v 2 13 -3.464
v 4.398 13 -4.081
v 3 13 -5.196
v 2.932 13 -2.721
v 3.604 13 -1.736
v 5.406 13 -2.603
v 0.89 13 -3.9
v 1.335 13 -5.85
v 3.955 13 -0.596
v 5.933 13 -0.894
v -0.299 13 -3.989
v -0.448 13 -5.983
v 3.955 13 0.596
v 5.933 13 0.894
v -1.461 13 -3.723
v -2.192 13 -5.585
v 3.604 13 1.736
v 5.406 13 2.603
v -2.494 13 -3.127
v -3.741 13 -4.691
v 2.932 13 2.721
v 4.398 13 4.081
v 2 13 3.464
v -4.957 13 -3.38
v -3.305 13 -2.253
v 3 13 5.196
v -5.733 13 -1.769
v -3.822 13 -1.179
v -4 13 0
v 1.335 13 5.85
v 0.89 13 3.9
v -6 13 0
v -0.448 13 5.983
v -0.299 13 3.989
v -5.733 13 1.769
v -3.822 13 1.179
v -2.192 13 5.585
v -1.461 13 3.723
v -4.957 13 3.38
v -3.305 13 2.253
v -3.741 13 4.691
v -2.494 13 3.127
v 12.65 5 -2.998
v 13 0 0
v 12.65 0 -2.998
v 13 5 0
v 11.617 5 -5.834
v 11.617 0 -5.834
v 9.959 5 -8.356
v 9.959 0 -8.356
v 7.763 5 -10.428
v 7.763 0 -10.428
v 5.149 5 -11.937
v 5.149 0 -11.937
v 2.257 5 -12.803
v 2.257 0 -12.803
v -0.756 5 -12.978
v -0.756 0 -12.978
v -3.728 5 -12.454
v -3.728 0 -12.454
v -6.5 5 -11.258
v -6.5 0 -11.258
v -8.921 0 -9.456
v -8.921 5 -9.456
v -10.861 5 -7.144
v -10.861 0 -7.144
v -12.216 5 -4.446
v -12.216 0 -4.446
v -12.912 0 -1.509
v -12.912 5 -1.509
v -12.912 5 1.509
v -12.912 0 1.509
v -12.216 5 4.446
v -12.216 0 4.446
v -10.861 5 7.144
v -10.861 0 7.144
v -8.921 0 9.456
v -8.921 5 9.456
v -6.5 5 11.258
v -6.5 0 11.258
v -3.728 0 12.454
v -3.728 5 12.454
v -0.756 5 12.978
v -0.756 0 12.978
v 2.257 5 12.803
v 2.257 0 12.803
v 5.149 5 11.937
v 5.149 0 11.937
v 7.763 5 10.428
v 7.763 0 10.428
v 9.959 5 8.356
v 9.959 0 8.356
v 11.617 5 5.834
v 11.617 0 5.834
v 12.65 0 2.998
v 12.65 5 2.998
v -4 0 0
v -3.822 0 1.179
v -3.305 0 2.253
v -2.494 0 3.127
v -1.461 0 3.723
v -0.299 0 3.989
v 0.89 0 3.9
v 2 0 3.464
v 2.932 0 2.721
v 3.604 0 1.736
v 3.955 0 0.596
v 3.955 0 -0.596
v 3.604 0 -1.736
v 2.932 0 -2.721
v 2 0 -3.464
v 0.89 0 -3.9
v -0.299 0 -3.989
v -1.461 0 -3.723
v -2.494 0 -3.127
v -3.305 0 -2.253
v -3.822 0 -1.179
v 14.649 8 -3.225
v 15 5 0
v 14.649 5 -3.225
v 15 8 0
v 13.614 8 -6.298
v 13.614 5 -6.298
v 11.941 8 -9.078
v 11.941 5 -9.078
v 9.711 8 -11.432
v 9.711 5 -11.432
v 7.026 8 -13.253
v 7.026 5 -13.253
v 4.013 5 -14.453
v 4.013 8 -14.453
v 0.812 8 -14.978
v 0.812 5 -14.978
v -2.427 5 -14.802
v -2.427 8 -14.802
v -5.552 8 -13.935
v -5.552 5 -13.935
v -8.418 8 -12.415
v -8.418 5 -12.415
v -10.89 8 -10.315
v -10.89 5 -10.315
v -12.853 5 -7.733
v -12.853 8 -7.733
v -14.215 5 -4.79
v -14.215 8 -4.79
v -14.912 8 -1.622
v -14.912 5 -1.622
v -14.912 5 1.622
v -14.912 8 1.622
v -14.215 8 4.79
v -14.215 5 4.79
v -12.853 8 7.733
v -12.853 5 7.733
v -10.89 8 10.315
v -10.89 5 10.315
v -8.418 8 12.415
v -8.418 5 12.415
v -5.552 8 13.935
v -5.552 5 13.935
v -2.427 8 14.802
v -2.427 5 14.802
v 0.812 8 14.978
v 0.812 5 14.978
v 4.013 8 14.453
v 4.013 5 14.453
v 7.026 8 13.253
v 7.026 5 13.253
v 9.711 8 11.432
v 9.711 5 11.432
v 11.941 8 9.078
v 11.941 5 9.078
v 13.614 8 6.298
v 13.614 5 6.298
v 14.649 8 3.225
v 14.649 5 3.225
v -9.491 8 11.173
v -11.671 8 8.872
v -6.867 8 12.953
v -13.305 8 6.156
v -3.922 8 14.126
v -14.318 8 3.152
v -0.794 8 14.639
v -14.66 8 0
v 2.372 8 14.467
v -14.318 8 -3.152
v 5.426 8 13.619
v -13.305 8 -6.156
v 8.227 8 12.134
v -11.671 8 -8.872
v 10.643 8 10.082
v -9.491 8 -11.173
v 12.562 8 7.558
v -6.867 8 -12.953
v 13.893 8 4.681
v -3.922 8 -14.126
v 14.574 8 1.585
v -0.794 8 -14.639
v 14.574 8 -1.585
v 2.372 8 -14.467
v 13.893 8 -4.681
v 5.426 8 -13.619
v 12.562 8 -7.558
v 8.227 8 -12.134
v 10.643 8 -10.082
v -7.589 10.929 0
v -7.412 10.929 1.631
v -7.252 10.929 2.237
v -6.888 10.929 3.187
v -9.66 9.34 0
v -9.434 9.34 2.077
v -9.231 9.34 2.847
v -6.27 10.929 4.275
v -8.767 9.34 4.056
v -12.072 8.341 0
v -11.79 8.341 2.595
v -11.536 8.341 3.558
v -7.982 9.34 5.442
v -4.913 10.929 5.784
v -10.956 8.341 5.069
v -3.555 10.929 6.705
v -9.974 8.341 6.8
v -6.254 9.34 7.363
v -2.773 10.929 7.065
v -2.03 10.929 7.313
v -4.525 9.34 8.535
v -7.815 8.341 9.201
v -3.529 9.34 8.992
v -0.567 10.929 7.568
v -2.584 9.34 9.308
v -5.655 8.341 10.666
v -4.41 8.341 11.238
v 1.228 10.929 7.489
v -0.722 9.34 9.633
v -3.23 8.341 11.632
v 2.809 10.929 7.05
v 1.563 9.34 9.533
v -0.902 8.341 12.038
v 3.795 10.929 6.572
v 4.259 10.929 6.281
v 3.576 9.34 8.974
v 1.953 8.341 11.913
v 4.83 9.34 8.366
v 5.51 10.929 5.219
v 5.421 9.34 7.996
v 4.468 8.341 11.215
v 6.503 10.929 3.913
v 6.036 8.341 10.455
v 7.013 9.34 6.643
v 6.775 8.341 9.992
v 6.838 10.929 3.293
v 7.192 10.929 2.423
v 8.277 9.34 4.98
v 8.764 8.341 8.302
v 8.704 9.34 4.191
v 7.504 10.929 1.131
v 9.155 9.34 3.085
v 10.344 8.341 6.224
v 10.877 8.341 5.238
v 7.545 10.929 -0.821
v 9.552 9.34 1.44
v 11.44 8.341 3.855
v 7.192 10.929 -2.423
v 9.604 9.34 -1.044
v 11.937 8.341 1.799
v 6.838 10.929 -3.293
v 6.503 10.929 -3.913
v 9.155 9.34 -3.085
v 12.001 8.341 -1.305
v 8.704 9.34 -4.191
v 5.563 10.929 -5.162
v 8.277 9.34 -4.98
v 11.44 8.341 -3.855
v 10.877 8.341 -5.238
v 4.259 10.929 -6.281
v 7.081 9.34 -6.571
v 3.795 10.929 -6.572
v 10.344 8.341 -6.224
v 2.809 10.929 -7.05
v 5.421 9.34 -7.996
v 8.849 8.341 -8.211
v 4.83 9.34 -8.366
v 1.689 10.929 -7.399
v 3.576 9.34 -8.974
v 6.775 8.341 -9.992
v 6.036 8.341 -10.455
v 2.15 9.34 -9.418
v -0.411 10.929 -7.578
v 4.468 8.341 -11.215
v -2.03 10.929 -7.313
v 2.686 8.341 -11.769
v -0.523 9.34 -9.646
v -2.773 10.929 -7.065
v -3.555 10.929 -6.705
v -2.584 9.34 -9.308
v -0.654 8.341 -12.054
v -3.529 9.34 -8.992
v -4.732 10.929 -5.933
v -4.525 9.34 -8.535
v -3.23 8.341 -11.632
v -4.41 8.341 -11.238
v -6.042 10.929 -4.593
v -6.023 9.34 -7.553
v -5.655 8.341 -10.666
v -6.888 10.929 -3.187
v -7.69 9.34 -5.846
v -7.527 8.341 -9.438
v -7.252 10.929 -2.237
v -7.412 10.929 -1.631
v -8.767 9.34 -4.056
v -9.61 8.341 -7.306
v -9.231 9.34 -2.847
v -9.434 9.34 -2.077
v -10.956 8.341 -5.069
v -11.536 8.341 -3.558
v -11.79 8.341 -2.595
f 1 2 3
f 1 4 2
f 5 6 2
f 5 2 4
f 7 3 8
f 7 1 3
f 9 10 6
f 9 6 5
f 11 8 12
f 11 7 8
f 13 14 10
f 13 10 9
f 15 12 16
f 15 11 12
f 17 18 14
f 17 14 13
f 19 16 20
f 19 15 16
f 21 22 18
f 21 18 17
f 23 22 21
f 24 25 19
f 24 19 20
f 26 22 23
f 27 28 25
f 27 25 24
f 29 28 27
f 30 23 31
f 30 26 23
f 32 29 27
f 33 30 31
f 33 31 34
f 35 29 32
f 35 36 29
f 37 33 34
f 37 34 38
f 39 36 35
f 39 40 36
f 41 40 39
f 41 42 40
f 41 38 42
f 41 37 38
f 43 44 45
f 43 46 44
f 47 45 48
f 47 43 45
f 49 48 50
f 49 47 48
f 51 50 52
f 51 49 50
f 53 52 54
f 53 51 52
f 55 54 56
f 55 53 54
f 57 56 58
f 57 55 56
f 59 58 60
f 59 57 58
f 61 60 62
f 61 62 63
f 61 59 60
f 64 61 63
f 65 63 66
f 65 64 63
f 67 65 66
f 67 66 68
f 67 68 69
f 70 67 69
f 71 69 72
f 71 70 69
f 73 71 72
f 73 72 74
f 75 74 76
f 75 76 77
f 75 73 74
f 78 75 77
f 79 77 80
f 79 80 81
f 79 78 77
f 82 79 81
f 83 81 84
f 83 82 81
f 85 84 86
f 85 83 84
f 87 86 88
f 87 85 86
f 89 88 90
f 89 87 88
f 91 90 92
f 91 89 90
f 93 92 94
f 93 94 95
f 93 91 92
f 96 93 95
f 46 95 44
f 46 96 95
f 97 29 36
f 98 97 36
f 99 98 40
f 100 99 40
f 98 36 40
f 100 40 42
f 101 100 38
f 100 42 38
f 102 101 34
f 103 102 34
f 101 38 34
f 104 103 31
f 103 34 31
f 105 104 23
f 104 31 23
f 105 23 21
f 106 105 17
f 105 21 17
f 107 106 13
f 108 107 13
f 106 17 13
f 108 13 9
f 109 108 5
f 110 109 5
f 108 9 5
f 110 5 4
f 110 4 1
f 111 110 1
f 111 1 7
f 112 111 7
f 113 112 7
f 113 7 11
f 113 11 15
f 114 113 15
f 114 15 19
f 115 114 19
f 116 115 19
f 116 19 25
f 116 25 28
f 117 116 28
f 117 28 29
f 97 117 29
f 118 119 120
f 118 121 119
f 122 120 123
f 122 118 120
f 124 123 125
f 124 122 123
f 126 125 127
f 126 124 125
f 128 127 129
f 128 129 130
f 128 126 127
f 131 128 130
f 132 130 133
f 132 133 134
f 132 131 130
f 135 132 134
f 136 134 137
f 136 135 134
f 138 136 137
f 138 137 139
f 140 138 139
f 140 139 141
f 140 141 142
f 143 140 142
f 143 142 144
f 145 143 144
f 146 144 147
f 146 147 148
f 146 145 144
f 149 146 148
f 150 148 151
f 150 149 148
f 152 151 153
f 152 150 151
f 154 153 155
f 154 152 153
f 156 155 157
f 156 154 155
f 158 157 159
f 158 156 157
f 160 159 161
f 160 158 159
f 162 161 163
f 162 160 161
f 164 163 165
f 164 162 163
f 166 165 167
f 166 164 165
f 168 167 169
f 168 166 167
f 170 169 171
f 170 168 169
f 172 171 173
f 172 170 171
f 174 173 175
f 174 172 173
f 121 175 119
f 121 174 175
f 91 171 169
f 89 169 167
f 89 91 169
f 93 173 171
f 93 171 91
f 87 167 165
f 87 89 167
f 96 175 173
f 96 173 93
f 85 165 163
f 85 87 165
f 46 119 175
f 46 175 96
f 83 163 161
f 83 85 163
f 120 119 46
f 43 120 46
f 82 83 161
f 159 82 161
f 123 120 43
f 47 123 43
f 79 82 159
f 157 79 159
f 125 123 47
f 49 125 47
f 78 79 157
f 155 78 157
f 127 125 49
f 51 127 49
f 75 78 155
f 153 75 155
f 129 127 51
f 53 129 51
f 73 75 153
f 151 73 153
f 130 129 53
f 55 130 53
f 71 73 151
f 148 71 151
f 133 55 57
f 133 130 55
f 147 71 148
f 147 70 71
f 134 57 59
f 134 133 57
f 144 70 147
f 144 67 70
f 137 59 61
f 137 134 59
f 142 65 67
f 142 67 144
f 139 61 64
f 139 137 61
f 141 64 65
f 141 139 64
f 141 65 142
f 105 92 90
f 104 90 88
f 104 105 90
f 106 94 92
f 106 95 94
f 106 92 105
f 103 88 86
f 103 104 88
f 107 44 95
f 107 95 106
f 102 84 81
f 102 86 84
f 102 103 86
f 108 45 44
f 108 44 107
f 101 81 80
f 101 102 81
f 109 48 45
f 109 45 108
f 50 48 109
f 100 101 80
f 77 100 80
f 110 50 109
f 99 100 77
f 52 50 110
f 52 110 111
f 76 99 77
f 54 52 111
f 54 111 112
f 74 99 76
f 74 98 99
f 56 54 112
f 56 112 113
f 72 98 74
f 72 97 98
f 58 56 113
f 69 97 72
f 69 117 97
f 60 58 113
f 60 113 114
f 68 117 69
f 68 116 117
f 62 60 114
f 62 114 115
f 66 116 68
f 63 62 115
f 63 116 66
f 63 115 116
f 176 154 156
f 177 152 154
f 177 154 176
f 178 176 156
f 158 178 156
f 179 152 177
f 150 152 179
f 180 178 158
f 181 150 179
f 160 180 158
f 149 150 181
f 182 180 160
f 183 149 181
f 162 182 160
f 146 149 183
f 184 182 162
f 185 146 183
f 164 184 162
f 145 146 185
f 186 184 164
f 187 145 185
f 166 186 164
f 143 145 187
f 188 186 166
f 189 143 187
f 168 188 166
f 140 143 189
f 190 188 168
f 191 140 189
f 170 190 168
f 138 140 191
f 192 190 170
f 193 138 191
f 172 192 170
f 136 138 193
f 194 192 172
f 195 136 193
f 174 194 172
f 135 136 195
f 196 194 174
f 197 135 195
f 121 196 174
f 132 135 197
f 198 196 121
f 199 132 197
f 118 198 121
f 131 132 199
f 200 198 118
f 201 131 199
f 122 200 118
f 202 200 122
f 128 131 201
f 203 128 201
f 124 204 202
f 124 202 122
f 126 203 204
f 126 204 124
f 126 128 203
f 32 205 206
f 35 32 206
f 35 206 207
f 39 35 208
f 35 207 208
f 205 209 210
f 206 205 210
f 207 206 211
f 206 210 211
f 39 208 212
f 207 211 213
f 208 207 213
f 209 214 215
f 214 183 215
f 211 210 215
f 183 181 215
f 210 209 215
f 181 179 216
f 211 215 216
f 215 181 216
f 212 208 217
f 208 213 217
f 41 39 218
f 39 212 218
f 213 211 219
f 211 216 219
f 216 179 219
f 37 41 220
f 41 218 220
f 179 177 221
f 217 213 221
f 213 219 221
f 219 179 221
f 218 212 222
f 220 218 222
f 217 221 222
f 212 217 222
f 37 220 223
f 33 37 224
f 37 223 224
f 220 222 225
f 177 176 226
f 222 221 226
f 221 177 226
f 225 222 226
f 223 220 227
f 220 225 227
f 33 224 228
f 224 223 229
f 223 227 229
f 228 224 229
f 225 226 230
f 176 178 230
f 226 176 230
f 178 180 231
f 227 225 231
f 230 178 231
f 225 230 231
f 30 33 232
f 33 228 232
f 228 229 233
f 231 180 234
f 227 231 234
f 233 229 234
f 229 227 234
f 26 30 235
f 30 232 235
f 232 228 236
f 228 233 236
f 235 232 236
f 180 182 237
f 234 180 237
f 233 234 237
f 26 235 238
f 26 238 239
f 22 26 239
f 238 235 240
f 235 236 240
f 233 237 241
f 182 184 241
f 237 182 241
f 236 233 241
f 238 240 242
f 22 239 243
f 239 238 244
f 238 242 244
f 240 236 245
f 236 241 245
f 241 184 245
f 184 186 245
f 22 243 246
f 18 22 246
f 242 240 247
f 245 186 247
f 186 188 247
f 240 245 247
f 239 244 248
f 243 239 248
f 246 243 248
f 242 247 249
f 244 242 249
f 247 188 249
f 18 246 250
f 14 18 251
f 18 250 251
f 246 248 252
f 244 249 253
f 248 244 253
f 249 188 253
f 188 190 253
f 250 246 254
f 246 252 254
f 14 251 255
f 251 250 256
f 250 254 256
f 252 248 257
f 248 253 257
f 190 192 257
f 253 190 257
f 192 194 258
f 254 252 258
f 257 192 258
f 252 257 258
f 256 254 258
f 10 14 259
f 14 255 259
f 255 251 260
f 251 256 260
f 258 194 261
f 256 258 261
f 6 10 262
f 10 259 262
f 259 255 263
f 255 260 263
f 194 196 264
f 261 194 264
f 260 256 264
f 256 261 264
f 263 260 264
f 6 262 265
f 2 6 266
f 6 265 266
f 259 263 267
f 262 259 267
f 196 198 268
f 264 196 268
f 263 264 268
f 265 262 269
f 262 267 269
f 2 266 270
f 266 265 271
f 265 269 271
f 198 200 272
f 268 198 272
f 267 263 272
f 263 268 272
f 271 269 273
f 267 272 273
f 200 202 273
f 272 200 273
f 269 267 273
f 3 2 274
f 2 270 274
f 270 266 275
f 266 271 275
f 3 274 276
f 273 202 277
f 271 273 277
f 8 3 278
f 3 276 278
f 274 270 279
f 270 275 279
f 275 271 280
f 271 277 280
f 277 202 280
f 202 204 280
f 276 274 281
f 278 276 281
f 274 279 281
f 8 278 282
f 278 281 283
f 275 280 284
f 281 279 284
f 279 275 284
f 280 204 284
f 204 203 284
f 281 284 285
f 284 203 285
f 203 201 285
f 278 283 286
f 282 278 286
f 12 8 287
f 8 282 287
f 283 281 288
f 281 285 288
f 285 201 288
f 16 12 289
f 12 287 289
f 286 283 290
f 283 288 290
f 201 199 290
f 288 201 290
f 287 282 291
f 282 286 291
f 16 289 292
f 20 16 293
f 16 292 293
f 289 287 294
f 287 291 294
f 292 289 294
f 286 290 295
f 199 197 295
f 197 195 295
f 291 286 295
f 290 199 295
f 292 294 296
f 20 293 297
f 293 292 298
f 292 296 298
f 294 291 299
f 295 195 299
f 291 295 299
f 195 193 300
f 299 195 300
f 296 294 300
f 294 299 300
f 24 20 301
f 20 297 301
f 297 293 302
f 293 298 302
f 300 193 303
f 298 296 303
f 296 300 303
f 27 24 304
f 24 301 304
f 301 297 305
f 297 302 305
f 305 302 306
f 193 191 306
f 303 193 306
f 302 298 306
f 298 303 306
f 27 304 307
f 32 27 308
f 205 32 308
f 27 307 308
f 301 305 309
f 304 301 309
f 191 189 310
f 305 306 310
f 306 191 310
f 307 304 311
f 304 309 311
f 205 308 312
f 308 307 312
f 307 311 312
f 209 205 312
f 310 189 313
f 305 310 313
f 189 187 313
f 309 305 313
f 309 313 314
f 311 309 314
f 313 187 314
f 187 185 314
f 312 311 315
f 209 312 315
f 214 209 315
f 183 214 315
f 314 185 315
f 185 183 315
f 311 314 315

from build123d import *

# Parameters (mm, degrees)
SKETCH_2_R          = 6
EXTRUDE_1_DEPTH     = 5
FILLET_2_R          = 10
SKETCH_3_R          = 4
CUT_EXTRUDE_1_DEPTH = 18


with BuildPart() as part:
    # 草图1 → 旋转1 (revolve)
    with BuildSketch(Plane.XY, mode=Mode.PRIVATE) as revolve_1_sk:
        Polygon((0, 0), (-13, 0), (-13, 5), (-15, 5), (-15, 8), (0, 8), align=None)
    revolve(revolve_1_sk.sketch.rotate(Axis((0, -267.914485955, 0), (0, 1, 0)), 180), axis=Axis((0, -267.914485955, 0), (0, 1, 0)))

    # 草图2 → 凸台-拉伸1 (add)
    with BuildSketch(Plane(origin=(0, 8, 0), x_dir=(1, 0, 0), z_dir=(0, 1, 0))):
        with Locations(Location((0, 0, 0), (0, 0, 180))):
            Circle(SKETCH_2_R)
    extrude(amount=EXTRUDE_1_DEPTH)

    # 圆角2
    # the kernel refuses this fillet: 10 mm, written as the material it adds along each edge
    with BuildSketch(Plane(origin=(0, 8, 0), x_dir=(-1, 0, 0), z_dir=(0, 0, -1))) as fillet_2_piece_1:
        with BuildLine():
            CenterArc((14.660254038, 10), FILLET_2_R, 210, 60)
            Line((6, 5), (6, 0))
            Line((6, 0), (14.660254038, 0))
        make_face()
    revolve(axis=Axis((0, 8, 0), (0, 1, 0)))

    # 草图3 → 切除-拉伸1 (cut)
    with BuildSketch(Plane(origin=(0, 13, 0), x_dir=(1, 0, 0), z_dir=(0, 1, 0))):
        with Locations(Location((0, 0, 0), (0, 0, 180))):
            Circle(SKETCH_3_R)
    extrude(amount=-CUT_EXTRUDE_1_DEPTH, mode=Mode.SUBTRACT)


solid = part.part
